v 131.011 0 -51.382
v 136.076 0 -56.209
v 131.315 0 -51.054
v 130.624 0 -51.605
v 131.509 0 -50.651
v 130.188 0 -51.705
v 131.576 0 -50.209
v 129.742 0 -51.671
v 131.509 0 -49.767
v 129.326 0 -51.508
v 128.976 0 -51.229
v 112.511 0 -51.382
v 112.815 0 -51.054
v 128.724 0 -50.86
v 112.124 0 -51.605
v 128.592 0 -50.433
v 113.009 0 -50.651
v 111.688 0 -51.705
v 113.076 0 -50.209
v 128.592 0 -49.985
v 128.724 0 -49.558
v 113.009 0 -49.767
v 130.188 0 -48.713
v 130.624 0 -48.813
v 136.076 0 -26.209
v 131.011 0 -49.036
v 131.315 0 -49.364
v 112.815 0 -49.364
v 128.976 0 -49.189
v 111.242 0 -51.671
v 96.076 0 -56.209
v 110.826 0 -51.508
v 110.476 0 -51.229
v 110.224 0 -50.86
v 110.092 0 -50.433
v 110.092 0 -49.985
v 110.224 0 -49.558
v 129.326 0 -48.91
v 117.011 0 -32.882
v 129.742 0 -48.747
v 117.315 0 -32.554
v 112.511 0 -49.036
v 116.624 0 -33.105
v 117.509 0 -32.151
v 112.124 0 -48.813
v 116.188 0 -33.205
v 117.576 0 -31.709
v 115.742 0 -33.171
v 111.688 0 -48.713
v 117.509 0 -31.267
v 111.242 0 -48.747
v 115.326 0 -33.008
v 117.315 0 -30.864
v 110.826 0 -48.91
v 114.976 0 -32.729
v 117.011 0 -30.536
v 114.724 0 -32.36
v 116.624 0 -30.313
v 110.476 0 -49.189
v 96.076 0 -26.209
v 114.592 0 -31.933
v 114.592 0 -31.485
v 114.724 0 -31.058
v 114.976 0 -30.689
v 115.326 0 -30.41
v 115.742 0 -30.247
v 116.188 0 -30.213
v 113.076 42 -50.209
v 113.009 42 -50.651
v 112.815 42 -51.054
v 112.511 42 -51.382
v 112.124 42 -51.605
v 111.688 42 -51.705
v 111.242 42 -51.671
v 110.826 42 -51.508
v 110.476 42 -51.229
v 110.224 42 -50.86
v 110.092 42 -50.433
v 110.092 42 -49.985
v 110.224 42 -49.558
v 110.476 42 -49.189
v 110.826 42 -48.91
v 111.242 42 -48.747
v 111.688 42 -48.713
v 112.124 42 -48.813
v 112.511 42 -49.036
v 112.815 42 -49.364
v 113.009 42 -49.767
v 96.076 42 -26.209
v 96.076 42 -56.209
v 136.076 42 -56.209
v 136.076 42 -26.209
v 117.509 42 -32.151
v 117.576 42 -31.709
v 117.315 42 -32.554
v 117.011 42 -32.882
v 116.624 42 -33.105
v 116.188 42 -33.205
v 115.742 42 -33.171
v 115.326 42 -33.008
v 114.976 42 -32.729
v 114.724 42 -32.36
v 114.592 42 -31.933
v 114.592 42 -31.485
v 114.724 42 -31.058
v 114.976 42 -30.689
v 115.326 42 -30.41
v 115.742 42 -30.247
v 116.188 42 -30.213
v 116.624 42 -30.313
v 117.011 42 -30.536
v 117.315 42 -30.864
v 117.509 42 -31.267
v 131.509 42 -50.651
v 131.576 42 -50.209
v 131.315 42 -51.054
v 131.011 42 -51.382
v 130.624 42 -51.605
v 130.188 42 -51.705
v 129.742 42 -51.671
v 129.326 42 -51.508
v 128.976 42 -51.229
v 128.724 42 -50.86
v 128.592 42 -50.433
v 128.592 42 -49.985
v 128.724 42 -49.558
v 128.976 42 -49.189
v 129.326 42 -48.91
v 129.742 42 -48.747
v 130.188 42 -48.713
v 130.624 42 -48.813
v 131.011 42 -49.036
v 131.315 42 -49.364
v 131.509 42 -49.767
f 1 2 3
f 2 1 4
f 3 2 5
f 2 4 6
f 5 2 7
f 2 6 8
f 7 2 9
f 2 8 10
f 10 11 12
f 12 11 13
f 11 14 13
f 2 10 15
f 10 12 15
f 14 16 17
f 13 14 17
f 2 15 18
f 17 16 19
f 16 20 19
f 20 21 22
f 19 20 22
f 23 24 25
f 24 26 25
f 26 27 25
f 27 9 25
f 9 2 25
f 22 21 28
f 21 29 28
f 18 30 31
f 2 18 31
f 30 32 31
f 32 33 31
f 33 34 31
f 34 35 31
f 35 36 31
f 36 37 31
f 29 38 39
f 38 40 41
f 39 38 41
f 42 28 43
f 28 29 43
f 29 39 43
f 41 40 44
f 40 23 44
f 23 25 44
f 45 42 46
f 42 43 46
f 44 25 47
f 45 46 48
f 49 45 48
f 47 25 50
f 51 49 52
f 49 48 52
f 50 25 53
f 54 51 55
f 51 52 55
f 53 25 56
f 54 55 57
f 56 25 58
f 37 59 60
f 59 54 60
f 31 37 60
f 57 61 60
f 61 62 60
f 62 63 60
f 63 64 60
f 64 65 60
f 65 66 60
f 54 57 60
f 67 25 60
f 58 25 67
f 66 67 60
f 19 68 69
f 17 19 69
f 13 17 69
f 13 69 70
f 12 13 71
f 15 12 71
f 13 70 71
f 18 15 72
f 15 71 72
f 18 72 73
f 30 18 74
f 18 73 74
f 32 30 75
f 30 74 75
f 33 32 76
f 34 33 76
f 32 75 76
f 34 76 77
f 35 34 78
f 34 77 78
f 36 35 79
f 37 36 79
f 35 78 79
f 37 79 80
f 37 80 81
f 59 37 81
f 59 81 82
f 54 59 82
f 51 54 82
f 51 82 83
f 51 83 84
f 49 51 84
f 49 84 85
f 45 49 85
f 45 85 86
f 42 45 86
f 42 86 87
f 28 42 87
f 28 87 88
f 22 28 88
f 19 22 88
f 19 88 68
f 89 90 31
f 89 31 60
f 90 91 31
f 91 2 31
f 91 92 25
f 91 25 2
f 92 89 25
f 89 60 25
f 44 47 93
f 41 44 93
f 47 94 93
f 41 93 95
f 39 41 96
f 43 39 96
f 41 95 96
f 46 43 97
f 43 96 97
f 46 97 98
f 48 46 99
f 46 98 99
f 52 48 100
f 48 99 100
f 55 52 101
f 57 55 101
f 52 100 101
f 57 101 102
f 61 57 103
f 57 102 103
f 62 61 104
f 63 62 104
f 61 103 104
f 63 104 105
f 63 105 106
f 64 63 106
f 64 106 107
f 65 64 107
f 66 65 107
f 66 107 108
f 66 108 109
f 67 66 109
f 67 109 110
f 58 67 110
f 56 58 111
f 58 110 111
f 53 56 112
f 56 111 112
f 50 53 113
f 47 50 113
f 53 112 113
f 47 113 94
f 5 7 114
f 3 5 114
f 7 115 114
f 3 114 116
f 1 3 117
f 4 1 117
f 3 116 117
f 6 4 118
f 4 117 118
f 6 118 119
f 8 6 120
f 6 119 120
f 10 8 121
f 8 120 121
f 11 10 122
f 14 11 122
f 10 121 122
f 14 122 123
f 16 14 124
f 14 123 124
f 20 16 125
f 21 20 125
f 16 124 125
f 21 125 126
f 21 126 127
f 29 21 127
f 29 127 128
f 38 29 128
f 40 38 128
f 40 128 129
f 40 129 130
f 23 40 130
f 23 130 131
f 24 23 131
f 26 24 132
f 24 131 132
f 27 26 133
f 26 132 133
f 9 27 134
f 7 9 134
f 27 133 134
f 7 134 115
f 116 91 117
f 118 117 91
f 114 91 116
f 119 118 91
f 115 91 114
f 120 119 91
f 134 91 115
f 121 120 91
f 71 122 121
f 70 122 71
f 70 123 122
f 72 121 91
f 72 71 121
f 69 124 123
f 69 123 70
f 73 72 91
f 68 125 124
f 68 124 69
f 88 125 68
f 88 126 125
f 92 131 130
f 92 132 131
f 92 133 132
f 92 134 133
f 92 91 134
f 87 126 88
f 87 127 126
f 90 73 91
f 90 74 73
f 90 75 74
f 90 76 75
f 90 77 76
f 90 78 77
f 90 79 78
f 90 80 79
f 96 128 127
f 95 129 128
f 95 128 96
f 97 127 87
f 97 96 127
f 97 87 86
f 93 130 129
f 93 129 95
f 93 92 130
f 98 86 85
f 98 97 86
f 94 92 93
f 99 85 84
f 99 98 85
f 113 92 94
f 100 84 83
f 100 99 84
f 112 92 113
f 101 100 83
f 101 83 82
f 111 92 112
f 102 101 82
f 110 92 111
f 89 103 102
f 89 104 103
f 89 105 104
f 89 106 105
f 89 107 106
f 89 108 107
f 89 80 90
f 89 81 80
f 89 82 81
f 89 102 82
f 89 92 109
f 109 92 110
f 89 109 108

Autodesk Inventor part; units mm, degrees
ref_plane "YZ Plane" through (0, 0, 0) normal (1, 0, 0) x (0, 1, 0)
ref_plane "XZ Plane" through (0, 0, 0) normal (0, 1, 0) x (-1, 0, 0)
ref_plane "XY Plane" through (0, 0, 0) normal (0, 0, 1) x (1, 0, 0)
sketch "Skizze1" plane through (0, 0, 0) normal (0, 1, 0) x (-1, 0, 0)
  line L0 (-96.0755, -26.209) -> (-136.0755, -26.209)
  line L1 (-136.0755, -26.209) -> (-136.0755, -56.209)
  line L2 (-136.0755, -56.209) -> (-96.0755, -56.209)
  line L3 (-96.0755, -56.209) -> (-96.0755, -26.209)
  point P0 (0, 0)
  dimension "d0" = 40
  dimension "d1" = 30
extrude "Extrusion1" add sketch "Skizze1" along normal blind 42
sketch "Skizze2" plane through (96.0755, 0, -26.209) normal (0, 0, 1) x (1, 0, 0)
  point P0 (-96.0755, 0)
sketch "Skizze3" plane through (0, 42, 0) normal (0, 1, 0) x (1, 0, 0)
  circle A0 centre (130.0755, 50.209) radius 1.5
  circle A1 centre (111.5755, 50.209) radius 1.5
  circle A2 centre (116.0755, 31.709) radius 1.5
  line L0 (136.0755, 56.209) -> (96.0755, 56.209) projected
  line L1 (136.0755, 26.209) -> (136.0755, 56.209) projected
  point P0 (0, 0)
  dimension "d4" = 3
  dimension "d5" = 3
  dimension "d6" = 3
  dimension "d7" = 6
  dimension "d8" = 6
  dimension "d9" = 6
  dimension "d10" = 18.5
  dimension "d11" = 18.5
  dimension "d12" = 20
extrude "Extrusion2" cut sketch "Skizze3" against normal through all
properties part number "01_Coolingblock"
